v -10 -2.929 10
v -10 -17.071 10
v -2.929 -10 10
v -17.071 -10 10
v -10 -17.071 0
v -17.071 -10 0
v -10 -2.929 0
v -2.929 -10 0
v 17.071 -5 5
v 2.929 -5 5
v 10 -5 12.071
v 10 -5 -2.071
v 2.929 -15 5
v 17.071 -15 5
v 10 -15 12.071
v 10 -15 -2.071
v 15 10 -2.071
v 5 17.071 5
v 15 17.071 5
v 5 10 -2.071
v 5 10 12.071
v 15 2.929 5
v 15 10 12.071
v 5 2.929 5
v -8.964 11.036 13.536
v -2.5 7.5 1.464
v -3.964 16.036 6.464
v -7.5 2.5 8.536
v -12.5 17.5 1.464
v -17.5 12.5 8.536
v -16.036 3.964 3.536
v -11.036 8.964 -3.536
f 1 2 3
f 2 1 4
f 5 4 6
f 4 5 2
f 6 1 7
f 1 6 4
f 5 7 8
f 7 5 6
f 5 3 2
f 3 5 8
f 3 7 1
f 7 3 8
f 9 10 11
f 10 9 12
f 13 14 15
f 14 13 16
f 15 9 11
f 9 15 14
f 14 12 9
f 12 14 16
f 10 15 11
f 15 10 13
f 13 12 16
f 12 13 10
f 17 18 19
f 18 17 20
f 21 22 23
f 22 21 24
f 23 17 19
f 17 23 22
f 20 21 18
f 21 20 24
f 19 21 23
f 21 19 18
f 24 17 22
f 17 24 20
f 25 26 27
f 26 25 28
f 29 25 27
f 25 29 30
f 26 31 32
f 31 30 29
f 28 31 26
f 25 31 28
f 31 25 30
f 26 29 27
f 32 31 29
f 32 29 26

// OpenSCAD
// OpenSCAD operators: translate and rotate
// Moves an child in the current reference frame

translate([-10,-10,5]) rotate([0,0,45]) cube([10,10,10], center=true);
translate([+10,-10,5]) rotate([0,45,0]) cube([10,10,10], center=true);
translate([+10,+10,5]) rotate([45,0,0]) cube([10,10,10], center=true);
translate([-10,+10,5]) rotate([45,45,45]) cube([10,10,10], center=true);

// The OpenSCAD % modifier makes a semi-transparent
// object.  This is useful to indicate the "ground"
// or other references for debugging.  They will not
// appear in the STL output for printing.
%translate([0,0,-1/2]) cube([100,100,1], center=true);
%translate([0,25,0]) cube([1,50,1], center=true);
